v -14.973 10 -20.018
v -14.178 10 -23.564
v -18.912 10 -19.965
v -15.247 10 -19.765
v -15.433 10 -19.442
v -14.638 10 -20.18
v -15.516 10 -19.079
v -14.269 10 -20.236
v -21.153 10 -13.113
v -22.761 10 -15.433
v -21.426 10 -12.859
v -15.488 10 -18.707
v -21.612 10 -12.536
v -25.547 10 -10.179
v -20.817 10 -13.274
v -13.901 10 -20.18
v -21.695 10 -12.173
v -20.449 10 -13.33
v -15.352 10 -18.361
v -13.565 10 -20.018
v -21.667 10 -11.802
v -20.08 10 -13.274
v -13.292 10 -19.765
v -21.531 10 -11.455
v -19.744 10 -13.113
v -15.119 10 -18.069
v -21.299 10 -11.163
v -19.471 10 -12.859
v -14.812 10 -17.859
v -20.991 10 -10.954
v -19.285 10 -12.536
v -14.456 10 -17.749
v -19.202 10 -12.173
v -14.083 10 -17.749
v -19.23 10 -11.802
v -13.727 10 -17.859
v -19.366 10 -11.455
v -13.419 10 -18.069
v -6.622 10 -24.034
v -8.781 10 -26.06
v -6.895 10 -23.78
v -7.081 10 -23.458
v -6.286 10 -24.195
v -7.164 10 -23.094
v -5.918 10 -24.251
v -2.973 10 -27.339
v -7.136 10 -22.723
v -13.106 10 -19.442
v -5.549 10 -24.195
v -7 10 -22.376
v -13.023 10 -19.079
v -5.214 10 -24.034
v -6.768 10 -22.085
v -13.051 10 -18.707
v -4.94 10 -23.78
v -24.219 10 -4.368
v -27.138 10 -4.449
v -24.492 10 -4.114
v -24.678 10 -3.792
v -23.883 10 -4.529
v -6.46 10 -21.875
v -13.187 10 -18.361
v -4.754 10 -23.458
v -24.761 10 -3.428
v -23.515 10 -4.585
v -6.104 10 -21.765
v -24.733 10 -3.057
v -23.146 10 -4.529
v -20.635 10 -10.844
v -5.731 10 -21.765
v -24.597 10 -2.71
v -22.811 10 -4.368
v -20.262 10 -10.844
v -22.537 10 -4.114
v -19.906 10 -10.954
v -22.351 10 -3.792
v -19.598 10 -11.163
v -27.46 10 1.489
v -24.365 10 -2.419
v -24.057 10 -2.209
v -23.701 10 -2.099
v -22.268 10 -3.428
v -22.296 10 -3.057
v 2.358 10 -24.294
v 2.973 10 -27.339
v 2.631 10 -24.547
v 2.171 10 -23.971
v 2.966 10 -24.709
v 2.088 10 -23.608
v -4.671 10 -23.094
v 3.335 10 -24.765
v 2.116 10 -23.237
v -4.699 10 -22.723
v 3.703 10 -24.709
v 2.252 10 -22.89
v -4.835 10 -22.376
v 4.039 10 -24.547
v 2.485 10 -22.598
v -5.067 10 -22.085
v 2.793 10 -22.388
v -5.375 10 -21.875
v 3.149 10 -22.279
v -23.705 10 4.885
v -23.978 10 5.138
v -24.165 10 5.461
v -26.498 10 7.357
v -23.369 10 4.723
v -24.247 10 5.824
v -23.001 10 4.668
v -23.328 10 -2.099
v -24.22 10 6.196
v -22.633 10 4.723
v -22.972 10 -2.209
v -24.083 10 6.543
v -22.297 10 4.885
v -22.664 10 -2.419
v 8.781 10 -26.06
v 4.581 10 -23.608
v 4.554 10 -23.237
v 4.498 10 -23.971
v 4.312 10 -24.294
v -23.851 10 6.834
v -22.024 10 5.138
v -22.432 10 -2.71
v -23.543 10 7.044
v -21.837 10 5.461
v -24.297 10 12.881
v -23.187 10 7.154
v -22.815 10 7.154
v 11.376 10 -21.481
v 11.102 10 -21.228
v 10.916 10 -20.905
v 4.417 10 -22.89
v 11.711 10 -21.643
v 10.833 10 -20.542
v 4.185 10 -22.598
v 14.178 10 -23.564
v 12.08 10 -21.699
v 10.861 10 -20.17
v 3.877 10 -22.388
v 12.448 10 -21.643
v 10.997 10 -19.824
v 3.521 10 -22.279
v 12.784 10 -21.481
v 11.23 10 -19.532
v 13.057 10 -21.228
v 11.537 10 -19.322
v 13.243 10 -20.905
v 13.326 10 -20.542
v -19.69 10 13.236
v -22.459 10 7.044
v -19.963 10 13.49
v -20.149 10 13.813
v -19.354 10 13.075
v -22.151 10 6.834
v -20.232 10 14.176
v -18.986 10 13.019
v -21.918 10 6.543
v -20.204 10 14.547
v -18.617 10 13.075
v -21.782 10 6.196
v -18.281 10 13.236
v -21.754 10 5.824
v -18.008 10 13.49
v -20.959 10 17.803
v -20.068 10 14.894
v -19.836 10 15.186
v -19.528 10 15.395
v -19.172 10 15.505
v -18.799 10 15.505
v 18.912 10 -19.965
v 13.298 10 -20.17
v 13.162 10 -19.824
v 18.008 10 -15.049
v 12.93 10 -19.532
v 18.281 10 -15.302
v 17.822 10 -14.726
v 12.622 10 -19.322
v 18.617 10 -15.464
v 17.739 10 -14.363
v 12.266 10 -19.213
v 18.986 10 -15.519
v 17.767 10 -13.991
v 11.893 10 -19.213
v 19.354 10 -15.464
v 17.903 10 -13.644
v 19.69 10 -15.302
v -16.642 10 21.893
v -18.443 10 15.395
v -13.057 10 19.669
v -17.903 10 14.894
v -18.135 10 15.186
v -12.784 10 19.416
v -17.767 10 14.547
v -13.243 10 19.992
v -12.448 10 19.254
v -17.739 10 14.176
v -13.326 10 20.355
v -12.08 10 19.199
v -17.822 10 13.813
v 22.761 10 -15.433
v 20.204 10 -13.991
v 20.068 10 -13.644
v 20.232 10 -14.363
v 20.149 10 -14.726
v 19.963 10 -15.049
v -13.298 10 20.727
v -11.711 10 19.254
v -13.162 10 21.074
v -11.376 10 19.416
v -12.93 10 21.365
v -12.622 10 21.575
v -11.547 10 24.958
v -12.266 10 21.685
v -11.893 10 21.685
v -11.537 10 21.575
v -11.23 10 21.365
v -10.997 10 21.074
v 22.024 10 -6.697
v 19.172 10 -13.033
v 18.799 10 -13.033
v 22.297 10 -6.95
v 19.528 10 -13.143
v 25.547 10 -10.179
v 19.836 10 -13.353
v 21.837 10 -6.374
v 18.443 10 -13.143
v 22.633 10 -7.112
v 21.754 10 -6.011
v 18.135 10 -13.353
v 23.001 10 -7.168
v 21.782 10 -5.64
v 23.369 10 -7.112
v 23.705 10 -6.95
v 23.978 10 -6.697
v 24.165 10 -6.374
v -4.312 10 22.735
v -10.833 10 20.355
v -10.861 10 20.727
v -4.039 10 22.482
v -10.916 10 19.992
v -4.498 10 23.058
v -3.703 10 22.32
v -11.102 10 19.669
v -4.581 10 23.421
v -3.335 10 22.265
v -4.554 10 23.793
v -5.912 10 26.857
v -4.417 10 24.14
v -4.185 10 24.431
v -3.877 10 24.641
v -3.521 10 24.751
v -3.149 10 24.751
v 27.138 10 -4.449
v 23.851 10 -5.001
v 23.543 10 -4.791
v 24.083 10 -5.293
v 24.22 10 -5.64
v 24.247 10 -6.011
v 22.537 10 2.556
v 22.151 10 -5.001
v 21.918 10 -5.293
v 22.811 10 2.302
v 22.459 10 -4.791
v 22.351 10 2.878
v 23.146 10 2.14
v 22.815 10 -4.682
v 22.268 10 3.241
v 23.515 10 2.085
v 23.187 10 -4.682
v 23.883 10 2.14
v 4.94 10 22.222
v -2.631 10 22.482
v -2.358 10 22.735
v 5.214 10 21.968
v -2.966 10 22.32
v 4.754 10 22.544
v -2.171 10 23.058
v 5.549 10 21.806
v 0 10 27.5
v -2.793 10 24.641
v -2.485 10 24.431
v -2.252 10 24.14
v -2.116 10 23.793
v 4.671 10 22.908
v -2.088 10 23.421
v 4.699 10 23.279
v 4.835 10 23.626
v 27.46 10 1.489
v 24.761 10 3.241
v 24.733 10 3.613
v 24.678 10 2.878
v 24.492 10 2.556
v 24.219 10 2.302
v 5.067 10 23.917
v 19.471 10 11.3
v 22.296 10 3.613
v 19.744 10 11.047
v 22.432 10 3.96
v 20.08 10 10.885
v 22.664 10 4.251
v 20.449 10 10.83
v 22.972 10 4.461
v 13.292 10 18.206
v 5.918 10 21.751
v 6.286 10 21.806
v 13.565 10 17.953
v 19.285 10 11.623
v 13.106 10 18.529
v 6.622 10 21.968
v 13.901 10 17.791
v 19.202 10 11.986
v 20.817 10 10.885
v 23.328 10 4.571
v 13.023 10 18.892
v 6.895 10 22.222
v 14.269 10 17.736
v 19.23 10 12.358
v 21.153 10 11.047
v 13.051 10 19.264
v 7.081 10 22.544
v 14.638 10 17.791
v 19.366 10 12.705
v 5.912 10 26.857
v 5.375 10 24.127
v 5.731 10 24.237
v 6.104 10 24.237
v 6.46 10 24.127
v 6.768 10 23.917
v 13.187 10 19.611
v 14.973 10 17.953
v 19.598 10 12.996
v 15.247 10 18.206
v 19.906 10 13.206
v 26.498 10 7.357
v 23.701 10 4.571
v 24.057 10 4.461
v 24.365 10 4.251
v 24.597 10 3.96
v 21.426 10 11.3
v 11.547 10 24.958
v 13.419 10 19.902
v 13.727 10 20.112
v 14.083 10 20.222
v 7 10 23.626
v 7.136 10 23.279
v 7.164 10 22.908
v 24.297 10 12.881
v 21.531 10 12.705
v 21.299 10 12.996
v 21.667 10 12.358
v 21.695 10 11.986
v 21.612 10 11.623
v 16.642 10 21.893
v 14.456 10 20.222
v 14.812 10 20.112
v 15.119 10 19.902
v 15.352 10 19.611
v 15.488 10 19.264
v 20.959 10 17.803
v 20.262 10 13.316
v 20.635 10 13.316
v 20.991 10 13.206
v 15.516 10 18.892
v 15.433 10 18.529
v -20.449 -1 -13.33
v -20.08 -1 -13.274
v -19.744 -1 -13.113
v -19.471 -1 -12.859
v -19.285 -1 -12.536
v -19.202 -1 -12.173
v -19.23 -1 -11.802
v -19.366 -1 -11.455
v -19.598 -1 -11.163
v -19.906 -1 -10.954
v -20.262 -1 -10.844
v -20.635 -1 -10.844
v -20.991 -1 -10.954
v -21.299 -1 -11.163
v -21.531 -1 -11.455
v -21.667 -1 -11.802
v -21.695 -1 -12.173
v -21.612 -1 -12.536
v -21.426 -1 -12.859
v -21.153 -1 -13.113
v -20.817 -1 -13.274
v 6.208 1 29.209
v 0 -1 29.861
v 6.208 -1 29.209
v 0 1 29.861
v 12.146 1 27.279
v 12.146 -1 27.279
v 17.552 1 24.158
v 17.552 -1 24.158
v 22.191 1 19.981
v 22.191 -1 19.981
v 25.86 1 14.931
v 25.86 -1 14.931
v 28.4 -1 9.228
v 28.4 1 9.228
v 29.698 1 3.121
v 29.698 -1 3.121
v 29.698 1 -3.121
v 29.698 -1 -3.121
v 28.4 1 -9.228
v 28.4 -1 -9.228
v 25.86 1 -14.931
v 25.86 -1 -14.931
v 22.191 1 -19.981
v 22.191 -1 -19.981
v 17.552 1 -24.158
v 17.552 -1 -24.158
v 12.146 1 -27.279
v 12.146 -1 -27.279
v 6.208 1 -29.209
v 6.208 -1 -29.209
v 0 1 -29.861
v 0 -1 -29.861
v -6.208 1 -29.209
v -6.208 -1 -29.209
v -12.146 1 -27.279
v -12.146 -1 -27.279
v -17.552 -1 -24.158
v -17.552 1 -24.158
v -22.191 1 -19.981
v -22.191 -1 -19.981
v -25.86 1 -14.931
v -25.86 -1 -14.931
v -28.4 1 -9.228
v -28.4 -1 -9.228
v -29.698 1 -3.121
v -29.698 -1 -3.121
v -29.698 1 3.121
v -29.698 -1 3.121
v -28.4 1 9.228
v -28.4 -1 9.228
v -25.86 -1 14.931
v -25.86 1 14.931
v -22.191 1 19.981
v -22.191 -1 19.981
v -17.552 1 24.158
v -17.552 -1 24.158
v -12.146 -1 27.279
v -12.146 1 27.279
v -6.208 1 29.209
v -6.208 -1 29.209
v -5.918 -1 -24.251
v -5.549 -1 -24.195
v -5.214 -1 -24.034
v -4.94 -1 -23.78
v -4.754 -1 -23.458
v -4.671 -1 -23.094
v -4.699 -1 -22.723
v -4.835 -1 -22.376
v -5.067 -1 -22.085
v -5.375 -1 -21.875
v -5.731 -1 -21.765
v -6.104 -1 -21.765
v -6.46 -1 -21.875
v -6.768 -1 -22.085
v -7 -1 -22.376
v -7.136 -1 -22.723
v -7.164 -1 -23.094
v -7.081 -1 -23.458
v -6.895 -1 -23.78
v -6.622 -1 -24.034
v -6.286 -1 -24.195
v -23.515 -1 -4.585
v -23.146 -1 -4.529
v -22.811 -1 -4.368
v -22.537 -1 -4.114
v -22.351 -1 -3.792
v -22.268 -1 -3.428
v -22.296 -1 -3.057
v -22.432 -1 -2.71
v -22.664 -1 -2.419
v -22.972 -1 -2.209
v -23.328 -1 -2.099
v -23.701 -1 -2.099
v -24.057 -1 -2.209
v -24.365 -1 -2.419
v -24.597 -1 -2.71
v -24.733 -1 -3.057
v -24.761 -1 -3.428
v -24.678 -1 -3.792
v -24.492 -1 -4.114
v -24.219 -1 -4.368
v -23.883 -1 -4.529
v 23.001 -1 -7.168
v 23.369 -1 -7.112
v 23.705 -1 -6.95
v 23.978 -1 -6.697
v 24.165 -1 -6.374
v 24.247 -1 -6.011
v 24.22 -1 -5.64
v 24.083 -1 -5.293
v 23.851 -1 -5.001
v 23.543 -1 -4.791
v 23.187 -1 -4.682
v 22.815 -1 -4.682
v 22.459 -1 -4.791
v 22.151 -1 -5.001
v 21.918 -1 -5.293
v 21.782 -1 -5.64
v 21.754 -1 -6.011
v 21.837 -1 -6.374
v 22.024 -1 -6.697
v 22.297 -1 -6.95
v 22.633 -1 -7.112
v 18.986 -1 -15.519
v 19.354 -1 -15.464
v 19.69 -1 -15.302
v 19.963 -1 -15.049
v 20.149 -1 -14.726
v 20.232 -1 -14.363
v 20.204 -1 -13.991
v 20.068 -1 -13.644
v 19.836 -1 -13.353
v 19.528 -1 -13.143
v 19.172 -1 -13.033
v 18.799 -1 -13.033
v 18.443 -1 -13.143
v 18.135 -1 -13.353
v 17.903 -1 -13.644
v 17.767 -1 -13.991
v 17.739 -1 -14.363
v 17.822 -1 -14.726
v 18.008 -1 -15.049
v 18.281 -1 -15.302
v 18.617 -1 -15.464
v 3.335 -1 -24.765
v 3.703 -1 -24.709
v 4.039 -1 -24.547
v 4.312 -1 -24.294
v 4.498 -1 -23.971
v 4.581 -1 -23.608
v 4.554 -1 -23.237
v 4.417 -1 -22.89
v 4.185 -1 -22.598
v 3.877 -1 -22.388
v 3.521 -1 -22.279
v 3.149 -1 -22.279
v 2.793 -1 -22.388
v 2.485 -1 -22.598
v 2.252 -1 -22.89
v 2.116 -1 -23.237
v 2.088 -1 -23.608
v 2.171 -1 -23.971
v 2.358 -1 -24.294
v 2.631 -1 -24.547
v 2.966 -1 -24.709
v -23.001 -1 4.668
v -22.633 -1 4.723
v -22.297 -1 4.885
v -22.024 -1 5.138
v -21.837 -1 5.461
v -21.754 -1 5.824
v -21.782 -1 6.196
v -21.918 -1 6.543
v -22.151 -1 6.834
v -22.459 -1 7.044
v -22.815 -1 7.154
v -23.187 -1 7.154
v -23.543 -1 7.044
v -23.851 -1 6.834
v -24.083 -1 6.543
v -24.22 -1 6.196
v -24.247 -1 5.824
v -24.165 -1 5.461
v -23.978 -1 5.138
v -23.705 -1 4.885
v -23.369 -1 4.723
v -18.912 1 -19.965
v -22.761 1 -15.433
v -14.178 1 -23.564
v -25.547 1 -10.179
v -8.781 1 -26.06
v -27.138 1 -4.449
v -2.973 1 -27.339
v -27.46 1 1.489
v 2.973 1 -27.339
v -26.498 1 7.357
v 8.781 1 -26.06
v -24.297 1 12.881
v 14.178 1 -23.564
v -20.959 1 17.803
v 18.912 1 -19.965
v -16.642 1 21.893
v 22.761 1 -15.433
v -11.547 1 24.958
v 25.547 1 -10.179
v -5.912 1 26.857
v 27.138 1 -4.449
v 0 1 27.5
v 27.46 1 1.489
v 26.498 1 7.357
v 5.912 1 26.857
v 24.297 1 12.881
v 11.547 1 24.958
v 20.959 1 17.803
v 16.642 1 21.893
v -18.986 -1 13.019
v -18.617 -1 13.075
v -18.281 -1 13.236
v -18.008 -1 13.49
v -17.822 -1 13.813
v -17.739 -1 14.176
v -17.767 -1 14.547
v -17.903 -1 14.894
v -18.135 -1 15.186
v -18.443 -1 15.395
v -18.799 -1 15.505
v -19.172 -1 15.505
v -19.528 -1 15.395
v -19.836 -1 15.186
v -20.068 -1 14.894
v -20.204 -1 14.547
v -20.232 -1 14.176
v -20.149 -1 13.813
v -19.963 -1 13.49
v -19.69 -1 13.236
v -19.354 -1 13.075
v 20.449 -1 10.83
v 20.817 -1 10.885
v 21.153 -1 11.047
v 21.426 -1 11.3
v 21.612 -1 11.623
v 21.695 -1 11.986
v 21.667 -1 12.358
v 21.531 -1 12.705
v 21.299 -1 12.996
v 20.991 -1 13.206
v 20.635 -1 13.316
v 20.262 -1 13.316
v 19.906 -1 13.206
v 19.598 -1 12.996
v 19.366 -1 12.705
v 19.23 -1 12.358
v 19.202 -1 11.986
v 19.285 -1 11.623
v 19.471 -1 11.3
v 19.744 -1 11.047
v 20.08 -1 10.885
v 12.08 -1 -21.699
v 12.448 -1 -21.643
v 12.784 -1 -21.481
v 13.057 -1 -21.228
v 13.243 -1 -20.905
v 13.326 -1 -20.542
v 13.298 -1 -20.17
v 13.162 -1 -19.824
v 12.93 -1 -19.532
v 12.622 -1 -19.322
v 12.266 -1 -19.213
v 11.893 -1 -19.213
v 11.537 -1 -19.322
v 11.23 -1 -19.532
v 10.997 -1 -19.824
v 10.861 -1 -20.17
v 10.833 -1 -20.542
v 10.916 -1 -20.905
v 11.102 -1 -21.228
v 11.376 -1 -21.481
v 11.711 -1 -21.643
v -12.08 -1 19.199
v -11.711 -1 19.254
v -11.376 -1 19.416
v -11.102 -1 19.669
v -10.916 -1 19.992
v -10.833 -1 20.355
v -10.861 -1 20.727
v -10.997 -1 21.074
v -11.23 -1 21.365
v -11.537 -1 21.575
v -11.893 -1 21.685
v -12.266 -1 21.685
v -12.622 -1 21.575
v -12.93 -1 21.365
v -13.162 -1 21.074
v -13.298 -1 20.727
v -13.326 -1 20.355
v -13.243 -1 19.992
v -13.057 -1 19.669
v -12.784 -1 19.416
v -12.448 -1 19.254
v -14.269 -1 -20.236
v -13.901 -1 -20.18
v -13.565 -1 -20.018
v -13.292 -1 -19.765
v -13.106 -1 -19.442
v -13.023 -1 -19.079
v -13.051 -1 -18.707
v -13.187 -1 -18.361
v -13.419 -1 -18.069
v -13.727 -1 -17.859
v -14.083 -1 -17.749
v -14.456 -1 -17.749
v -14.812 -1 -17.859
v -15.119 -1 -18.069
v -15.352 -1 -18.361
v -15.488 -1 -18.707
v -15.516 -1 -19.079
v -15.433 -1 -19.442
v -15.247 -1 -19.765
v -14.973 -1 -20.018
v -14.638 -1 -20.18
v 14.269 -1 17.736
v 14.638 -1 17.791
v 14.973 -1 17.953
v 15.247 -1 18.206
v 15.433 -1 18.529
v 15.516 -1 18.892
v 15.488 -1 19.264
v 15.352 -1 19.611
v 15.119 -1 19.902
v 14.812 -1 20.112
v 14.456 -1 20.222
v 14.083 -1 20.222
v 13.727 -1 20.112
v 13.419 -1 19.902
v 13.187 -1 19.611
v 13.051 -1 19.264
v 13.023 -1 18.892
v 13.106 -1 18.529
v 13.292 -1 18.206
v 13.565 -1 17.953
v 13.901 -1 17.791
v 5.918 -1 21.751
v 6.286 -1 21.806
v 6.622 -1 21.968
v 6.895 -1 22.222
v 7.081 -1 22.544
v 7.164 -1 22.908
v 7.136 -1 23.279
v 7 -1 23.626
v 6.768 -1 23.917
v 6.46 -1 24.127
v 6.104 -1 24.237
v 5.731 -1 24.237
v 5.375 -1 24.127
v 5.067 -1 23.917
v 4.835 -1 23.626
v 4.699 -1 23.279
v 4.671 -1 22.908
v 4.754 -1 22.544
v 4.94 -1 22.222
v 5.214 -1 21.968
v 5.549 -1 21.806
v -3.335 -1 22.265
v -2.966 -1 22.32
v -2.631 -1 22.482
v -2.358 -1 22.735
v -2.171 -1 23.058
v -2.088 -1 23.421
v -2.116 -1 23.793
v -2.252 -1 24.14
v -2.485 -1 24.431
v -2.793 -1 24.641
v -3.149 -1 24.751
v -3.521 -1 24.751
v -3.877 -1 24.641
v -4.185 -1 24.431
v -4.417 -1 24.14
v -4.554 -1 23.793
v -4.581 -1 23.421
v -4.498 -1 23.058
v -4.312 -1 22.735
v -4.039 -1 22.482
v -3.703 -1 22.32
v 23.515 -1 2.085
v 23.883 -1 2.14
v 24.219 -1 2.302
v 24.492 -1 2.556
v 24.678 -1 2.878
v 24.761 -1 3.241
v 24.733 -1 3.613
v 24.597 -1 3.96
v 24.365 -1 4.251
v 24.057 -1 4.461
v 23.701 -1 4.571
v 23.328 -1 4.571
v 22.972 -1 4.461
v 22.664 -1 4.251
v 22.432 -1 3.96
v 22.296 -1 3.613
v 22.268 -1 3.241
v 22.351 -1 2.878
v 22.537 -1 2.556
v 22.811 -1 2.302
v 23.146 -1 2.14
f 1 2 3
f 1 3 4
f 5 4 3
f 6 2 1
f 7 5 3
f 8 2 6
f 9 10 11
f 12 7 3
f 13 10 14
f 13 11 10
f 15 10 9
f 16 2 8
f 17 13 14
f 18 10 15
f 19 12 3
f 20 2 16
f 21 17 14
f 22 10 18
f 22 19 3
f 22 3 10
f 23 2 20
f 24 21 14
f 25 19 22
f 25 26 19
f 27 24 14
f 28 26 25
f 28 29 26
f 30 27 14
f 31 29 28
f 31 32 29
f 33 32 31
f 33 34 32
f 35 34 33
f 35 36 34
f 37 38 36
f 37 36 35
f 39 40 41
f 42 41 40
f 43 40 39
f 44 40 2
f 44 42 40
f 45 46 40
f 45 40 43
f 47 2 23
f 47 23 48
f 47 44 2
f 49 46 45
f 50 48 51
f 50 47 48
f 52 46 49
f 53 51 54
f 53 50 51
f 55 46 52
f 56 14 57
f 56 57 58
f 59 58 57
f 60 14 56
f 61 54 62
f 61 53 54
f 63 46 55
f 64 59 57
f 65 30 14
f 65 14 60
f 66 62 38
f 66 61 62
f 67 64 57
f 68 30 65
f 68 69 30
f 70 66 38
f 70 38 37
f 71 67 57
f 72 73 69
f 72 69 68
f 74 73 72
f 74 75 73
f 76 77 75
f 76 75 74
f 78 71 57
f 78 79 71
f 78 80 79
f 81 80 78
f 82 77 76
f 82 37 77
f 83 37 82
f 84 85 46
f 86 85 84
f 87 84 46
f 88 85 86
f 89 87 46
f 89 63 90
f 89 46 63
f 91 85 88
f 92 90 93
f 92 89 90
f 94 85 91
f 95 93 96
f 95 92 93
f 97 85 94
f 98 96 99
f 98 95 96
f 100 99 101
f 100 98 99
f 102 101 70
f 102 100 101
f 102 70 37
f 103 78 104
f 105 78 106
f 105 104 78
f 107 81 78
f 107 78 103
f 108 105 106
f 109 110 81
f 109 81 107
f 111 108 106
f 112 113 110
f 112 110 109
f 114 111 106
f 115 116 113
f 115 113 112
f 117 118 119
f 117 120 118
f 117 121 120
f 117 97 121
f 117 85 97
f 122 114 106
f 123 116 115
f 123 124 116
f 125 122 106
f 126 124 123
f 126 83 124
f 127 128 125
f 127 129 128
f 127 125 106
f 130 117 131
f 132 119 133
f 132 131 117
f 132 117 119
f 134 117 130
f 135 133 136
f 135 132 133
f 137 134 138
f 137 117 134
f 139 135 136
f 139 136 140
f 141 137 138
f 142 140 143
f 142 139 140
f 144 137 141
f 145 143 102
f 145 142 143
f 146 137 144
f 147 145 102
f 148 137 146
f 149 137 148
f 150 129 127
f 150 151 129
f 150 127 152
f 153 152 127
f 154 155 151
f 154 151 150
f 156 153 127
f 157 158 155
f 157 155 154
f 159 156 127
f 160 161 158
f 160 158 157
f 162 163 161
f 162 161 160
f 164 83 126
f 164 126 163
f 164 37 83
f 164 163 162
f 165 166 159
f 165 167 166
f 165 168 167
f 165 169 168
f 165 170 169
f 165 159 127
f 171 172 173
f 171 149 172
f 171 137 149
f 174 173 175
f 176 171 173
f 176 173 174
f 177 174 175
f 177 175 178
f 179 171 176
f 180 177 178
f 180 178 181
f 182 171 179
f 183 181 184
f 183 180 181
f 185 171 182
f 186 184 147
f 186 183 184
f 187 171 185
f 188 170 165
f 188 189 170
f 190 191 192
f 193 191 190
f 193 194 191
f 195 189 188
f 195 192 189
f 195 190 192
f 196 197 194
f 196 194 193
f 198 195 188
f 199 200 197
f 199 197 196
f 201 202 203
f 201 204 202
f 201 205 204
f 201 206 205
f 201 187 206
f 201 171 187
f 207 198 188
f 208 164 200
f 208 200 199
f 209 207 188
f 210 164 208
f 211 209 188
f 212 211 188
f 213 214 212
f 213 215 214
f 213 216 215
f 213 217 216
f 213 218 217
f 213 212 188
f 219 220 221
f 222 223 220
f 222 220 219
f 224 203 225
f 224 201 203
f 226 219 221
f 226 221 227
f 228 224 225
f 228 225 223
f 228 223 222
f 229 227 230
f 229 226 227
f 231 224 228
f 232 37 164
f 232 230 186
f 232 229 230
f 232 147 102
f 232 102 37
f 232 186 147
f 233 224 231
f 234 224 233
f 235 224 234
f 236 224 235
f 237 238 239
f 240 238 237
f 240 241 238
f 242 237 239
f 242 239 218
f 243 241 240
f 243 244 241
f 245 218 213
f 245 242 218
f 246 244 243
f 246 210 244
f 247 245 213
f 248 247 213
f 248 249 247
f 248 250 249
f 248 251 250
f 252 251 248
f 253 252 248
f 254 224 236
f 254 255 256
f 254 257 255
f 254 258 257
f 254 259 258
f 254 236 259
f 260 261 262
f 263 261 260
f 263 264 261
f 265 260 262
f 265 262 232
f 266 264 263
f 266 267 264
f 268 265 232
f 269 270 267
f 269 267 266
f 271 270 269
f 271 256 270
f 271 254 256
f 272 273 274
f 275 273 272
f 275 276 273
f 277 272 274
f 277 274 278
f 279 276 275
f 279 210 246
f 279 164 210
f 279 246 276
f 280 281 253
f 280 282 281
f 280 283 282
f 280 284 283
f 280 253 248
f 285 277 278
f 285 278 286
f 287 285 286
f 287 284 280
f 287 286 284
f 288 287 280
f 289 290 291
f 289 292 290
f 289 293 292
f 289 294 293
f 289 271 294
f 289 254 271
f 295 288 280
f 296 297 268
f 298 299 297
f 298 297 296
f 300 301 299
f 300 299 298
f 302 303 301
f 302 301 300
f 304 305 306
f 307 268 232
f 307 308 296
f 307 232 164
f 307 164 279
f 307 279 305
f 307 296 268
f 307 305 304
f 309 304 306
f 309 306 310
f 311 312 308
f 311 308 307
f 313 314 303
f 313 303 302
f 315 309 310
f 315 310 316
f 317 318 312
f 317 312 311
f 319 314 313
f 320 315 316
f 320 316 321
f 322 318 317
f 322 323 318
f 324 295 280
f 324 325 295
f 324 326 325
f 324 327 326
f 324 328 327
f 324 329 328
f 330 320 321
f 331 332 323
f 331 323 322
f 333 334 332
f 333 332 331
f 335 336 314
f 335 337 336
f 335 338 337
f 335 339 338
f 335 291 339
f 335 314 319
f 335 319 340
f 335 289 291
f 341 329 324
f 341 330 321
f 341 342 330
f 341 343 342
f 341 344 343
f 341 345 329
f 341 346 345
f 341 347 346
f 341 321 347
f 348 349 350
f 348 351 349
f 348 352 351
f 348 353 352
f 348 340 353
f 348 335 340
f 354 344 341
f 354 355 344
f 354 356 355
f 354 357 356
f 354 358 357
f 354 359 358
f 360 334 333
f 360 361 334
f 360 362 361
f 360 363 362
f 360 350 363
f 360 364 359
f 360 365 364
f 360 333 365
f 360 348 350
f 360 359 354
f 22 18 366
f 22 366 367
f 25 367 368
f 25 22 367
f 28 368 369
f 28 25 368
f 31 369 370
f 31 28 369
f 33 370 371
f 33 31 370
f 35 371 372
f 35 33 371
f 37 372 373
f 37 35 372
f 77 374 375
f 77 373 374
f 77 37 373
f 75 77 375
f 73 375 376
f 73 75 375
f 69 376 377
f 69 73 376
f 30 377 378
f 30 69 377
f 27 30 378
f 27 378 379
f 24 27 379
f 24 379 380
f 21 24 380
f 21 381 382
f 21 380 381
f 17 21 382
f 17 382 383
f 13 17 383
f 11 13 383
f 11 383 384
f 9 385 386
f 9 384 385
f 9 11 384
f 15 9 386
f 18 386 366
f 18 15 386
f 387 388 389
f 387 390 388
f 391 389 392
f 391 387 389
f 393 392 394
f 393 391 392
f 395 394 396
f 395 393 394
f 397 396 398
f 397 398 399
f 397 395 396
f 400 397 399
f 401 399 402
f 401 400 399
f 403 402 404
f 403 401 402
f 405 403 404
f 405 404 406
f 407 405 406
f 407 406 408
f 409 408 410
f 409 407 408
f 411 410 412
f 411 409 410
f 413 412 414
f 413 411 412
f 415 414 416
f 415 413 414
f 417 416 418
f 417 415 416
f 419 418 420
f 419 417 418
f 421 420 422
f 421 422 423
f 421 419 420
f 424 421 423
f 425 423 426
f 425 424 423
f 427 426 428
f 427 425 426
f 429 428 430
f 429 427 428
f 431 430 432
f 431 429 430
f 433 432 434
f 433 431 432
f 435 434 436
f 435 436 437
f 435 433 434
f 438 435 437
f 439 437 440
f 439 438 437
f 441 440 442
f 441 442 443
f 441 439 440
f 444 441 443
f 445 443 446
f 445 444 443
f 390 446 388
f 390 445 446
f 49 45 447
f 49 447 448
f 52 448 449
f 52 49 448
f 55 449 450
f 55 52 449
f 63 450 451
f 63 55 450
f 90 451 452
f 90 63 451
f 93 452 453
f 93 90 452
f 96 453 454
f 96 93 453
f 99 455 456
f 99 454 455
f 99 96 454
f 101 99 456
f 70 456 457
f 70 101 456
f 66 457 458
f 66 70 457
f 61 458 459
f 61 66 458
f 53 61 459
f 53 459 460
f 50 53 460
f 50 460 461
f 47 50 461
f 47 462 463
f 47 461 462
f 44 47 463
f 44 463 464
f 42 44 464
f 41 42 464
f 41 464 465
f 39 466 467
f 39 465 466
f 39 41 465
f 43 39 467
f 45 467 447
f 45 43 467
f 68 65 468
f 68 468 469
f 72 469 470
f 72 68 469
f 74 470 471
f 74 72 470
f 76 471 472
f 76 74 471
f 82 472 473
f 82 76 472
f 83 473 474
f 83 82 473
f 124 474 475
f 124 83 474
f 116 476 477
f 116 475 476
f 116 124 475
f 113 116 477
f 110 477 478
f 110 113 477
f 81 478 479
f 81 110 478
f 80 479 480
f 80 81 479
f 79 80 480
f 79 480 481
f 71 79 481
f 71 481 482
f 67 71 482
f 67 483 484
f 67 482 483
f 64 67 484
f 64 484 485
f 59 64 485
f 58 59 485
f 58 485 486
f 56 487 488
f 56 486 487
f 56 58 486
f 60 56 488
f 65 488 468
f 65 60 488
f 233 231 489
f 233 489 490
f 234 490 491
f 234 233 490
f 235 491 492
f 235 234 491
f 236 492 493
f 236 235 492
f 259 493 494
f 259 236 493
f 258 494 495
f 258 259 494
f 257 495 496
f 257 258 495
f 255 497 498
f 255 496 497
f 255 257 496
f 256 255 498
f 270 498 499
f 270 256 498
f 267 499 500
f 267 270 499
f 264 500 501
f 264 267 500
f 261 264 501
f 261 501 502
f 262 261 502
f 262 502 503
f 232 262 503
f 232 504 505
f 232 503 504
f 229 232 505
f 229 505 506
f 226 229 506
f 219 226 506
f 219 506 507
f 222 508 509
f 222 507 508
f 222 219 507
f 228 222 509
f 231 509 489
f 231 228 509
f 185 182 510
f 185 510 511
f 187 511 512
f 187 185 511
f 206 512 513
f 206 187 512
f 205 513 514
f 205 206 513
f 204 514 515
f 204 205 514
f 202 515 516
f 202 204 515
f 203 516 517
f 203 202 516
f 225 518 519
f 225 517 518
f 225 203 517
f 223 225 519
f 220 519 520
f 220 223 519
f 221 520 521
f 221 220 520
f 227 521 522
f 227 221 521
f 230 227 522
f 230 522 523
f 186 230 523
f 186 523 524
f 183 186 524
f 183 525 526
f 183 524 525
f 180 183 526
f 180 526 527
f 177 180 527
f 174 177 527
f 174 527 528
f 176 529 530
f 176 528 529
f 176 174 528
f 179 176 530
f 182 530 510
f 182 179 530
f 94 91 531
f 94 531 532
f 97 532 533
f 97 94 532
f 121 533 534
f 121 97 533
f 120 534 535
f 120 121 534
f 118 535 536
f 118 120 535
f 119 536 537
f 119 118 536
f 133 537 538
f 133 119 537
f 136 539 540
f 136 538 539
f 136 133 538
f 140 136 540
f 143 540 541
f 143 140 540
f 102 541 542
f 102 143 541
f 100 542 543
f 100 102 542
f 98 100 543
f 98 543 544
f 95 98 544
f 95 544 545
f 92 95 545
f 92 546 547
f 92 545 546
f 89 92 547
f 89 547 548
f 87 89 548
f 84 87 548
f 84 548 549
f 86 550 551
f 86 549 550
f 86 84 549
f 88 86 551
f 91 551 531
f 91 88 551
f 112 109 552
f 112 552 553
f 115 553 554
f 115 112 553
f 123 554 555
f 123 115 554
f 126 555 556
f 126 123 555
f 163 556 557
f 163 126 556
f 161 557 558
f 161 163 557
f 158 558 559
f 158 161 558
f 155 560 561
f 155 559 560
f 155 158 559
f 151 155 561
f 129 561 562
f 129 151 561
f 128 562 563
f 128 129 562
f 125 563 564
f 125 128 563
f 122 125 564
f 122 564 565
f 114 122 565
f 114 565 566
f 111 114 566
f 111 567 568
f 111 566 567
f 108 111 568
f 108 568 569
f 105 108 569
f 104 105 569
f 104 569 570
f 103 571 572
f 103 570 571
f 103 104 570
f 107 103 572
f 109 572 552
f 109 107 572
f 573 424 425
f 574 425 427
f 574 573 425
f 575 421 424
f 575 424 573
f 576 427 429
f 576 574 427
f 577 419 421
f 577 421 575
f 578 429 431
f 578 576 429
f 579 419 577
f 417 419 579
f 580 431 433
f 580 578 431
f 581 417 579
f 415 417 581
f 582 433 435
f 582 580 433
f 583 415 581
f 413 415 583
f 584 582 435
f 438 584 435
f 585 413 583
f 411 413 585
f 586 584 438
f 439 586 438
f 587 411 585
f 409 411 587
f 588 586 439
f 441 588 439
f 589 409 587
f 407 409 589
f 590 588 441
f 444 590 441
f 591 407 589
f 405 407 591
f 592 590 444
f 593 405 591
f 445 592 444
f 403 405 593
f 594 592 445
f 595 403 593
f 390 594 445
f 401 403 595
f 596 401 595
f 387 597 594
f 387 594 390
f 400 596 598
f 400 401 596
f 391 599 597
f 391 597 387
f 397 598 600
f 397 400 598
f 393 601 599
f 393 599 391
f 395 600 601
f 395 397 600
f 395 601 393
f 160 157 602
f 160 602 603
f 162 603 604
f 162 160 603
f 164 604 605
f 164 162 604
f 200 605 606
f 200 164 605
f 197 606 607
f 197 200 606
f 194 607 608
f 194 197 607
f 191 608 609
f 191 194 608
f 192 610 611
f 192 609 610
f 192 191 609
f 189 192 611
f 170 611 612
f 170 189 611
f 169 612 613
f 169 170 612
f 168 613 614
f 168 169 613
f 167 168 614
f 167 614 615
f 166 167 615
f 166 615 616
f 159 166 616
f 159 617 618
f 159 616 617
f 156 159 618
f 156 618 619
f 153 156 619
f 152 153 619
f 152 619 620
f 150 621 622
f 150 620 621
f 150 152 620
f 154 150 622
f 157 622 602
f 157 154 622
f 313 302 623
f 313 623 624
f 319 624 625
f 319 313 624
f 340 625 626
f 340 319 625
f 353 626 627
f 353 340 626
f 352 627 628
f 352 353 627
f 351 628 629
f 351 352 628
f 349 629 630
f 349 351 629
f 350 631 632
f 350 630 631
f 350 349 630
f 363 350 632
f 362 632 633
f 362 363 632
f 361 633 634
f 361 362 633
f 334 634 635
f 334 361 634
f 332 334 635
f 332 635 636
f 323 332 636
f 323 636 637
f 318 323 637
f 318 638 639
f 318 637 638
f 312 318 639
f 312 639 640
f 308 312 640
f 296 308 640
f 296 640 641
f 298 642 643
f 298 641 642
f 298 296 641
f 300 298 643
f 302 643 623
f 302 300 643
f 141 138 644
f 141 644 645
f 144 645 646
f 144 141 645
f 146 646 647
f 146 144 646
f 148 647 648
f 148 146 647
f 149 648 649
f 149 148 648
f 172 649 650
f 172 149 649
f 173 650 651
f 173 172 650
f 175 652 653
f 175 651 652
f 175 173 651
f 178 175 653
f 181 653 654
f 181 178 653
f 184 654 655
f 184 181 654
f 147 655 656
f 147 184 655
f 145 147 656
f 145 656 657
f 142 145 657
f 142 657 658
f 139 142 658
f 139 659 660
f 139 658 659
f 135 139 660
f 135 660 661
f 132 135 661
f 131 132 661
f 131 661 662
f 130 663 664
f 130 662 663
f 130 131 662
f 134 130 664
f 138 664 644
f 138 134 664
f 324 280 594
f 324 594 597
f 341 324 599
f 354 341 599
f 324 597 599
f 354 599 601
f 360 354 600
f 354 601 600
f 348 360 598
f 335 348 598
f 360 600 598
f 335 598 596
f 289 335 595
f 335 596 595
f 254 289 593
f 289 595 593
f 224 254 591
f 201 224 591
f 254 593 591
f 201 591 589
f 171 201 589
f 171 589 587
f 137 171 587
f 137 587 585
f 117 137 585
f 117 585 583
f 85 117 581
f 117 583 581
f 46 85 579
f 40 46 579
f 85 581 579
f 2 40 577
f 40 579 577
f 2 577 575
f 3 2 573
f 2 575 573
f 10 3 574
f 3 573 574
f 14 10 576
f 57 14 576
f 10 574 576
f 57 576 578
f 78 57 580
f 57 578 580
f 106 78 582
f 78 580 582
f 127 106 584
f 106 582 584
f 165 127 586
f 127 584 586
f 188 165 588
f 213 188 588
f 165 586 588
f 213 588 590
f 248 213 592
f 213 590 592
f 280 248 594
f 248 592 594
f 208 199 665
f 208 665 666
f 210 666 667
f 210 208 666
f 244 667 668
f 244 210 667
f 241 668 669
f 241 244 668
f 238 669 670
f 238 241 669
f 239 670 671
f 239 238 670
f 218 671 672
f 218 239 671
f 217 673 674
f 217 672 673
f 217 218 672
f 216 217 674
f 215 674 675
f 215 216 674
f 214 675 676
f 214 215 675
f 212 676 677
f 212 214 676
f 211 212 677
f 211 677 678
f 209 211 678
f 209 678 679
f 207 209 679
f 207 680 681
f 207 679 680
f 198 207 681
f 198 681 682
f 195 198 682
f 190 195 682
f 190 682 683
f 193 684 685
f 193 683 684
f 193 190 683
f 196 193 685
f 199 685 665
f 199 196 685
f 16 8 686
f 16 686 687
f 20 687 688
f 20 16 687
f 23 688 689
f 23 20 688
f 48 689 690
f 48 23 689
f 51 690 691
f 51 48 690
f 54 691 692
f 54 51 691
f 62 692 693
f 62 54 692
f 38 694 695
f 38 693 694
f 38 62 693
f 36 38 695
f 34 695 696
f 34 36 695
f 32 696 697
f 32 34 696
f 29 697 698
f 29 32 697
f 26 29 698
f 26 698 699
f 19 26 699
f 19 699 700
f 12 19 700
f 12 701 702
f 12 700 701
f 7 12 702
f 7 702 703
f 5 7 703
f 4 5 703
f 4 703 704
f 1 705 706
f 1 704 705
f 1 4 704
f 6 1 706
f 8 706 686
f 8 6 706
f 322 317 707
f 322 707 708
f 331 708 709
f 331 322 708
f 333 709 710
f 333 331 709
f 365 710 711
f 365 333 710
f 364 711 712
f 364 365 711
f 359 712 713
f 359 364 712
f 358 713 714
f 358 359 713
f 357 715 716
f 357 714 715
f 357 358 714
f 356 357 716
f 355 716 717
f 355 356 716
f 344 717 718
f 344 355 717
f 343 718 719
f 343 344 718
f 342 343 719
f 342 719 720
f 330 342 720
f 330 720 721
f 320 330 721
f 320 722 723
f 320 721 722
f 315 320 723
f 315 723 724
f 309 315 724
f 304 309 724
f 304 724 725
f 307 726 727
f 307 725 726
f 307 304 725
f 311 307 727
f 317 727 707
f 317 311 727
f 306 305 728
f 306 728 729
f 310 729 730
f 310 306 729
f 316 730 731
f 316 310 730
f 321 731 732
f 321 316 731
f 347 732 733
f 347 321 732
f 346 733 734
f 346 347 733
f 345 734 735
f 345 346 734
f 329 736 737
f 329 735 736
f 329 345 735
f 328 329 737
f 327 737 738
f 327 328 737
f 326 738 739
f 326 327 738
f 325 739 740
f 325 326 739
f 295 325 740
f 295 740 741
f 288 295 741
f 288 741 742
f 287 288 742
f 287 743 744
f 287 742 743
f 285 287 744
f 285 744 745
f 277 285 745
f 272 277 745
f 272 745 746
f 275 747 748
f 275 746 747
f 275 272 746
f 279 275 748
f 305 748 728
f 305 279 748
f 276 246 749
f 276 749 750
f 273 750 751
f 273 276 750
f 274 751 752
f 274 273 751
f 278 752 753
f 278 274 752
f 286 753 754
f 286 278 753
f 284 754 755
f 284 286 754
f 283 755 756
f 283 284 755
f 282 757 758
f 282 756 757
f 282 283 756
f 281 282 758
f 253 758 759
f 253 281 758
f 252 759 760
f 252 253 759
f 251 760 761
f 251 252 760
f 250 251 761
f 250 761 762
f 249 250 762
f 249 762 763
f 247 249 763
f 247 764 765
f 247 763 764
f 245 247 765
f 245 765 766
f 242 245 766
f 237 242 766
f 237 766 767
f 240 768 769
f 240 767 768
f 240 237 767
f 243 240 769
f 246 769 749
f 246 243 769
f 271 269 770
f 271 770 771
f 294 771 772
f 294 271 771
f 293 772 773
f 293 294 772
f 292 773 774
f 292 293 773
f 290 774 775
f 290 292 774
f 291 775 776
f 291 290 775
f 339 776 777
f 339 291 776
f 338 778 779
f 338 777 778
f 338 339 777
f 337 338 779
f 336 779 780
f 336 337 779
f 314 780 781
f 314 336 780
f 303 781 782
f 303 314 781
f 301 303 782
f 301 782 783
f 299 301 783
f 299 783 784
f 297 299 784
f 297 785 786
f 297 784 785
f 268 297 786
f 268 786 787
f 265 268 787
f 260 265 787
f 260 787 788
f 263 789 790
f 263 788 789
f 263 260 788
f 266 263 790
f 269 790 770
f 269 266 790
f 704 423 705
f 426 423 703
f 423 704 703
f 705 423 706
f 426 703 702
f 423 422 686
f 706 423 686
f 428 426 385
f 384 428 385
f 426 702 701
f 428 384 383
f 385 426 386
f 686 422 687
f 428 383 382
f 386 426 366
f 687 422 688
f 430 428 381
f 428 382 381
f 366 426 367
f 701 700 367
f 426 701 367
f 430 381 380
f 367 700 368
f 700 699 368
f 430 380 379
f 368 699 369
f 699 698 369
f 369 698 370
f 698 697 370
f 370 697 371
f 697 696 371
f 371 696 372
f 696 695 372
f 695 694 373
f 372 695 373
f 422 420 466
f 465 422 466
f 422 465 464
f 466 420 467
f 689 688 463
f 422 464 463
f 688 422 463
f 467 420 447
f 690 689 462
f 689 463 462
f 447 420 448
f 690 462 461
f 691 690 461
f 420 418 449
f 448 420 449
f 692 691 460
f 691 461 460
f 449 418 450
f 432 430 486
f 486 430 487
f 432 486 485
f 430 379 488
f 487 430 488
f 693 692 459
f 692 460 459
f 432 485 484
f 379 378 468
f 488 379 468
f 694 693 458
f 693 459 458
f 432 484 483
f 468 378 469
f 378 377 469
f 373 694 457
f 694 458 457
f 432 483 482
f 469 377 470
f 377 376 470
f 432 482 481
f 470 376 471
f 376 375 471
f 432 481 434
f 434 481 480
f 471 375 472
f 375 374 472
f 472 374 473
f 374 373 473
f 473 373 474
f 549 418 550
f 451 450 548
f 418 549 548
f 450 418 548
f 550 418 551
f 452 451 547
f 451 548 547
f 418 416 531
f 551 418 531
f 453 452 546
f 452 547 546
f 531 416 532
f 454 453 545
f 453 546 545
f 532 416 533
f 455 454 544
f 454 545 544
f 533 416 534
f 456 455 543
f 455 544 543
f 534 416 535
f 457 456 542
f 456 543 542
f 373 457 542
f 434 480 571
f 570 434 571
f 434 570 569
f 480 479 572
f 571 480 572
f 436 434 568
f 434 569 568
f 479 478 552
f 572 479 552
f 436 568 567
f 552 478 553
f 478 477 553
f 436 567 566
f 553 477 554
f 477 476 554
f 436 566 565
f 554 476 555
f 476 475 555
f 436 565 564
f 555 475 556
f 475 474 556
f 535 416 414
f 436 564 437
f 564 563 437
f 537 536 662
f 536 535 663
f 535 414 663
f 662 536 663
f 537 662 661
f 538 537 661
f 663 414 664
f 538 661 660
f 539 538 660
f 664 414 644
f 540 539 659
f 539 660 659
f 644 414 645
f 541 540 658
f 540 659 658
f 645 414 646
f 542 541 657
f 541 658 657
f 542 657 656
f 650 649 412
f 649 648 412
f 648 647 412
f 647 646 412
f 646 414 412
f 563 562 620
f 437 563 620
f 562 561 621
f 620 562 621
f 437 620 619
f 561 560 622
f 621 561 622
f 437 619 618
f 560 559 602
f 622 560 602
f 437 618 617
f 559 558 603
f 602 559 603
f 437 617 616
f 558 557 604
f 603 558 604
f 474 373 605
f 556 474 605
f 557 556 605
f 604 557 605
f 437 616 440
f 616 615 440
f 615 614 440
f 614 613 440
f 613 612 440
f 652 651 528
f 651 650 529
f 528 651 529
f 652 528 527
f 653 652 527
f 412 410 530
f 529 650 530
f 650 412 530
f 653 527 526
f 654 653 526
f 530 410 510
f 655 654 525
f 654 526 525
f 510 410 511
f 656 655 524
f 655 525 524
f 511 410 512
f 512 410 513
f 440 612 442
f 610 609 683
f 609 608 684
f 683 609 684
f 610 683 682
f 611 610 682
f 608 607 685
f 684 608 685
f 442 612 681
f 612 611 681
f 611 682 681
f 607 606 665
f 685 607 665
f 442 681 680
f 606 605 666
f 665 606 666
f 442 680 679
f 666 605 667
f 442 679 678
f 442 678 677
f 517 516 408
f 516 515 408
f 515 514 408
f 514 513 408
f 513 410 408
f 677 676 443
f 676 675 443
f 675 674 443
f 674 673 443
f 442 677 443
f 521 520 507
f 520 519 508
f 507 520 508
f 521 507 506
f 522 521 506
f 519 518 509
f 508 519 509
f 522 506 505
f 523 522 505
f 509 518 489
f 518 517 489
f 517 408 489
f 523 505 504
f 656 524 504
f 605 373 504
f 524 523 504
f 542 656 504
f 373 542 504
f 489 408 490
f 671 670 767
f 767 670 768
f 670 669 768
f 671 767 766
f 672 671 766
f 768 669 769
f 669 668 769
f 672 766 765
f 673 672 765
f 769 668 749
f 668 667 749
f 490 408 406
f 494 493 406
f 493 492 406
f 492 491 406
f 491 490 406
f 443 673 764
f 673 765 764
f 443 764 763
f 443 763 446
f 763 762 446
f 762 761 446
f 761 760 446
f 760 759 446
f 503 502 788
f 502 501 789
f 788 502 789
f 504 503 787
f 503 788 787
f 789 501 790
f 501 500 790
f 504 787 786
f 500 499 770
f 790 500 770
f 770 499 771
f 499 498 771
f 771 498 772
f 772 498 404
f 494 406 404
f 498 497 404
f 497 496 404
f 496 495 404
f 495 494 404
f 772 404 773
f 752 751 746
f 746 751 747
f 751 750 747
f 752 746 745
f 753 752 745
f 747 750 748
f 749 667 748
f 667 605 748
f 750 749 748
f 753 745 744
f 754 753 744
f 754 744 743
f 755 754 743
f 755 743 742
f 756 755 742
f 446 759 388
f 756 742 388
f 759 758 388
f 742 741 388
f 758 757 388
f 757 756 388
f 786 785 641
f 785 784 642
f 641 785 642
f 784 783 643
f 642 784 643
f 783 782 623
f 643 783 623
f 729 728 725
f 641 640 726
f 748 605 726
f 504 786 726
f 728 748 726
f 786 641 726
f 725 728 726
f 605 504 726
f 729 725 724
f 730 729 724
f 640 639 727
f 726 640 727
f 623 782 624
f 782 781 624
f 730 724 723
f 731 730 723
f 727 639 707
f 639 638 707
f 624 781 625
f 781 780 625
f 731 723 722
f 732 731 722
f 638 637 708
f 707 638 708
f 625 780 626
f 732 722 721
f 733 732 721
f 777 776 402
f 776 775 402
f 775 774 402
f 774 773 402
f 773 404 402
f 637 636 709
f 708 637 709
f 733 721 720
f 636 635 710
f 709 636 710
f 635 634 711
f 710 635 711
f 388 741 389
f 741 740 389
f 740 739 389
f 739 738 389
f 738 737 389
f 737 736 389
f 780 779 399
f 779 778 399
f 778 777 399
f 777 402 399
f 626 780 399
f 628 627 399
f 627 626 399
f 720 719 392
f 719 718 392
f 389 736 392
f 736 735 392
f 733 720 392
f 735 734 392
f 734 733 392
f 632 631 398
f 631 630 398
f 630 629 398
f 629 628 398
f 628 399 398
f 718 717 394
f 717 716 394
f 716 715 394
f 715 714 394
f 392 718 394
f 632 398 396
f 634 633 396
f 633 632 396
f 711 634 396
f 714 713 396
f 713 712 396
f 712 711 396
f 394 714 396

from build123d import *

# Parameters (mm, degrees)
SKETCH1_R               = 29.86111111
BOSS_EXTRUDE1_DEPTH     = 1
SKETCH2_R               = 27.5
BOSS_EXTRUDE2_DEPTH     = 9
CUT_EXTRUDE1_DEPTH      = 44.639109907
CUT_EXTRUDE1_DEPTH_BACK = 44.639109907
SKETCH3_R               = 1.25


with BuildPart() as part:
    # Sketch1 → Boss-Extrude1 (new, symmetric)
    with BuildSketch(Plane(origin=(0, 0, 0), x_dir=(1, 0, 0), z_dir=(0, 1, 0))):
        with Locations(Location((0, 0, 0), (0, 0, 270))):
            Circle(SKETCH1_R)
    extrude(amount=BOSS_EXTRUDE1_DEPTH, both=True)

    # Sketch2 → Boss-Extrude2 (add)
    with BuildSketch(Plane(origin=(0, 1, 0), x_dir=(1, 0, 0), z_dir=(0, 1, 0))):
        with Locations(Location((0, 0, 0), (0, 0, 270))):
            Circle(SKETCH2_R)
    extrude(amount=BOSS_EXTRUDE2_DEPTH)

    # Sketch3 → Cut-Extrude1 (cut, two sides: drawn at the far end of the back side and taken through both)
    with BuildSketch(Plane.XZ.offset(1).offset(-CUT_EXTRUDE1_DEPTH_BACK)):
        with Locations(Location((23.000954051, -5.917652637, 0), (0, 0, 270))):
            Circle(SKETCH3_R)
        with Locations(Location((23.514698299, 3.334885892, 0), (0, 0, 270))):
            Circle(SKETCH3_R)
        with Locations(Location((20.448542892, 12.079718275, 0), (0, 0, 270))):
            Circle(SKETCH3_R)
        with Locations(Location((14.269282196, 18.985523054, 0), (0, 0, 270))):
            Circle(SKETCH3_R)
        with Locations(Location((18.985523054, -14.269282196, 0), (0, 0, 270))):
            Circle(SKETCH3_R)
        with Locations(Location((5.917652637, 23.000954051, 0), (0, 0, 270))):
            Circle(SKETCH3_R)
        with Locations(Location((-3.334885892, 23.514698299, 0), (0, 0, 270))):
            Circle(SKETCH3_R)
        with Locations(Location((-12.079718275, 20.448542892, 0), (0, 0, 270))):
            Circle(SKETCH3_R)
        with Locations(Location((-18.985523054, 14.269282196, 0), (0, 0, 270))):
            Circle(SKETCH3_R)
        with Locations(Location((-23.000954051, 5.917652637, 0), (0, 0, 270))):
            Circle(SKETCH3_R)
        with Locations(Location((-23.514698299, -3.334885892, 0), (0, 0, 270))):
            Circle(SKETCH3_R)
        with Locations(Location((12.079718275, -20.448542892, 0), (0, 0, 270))):
            Circle(SKETCH3_R)
        with Locations(Location((3.334885892, -23.514698299, 0), (0, 0, 270))):
            Circle(SKETCH3_R)
        with Locations(Location((-5.917652637, -23.000954051, 0), (0, 0, 270))):
            Circle(SKETCH3_R)
        with Locations(Location((-14.269282196, -18.985523054, 0), (0, 0, 270))):
            Circle(SKETCH3_R)
        with Locations(Location((-20.448542892, -12.079718275, 0), (0, 0, 270))):
            Circle(SKETCH3_R)
    extrude(amount=CUT_EXTRUDE1_DEPTH + CUT_EXTRUDE1_DEPTH_BACK, mode=Mode.SUBTRACT)


solid = part.part
